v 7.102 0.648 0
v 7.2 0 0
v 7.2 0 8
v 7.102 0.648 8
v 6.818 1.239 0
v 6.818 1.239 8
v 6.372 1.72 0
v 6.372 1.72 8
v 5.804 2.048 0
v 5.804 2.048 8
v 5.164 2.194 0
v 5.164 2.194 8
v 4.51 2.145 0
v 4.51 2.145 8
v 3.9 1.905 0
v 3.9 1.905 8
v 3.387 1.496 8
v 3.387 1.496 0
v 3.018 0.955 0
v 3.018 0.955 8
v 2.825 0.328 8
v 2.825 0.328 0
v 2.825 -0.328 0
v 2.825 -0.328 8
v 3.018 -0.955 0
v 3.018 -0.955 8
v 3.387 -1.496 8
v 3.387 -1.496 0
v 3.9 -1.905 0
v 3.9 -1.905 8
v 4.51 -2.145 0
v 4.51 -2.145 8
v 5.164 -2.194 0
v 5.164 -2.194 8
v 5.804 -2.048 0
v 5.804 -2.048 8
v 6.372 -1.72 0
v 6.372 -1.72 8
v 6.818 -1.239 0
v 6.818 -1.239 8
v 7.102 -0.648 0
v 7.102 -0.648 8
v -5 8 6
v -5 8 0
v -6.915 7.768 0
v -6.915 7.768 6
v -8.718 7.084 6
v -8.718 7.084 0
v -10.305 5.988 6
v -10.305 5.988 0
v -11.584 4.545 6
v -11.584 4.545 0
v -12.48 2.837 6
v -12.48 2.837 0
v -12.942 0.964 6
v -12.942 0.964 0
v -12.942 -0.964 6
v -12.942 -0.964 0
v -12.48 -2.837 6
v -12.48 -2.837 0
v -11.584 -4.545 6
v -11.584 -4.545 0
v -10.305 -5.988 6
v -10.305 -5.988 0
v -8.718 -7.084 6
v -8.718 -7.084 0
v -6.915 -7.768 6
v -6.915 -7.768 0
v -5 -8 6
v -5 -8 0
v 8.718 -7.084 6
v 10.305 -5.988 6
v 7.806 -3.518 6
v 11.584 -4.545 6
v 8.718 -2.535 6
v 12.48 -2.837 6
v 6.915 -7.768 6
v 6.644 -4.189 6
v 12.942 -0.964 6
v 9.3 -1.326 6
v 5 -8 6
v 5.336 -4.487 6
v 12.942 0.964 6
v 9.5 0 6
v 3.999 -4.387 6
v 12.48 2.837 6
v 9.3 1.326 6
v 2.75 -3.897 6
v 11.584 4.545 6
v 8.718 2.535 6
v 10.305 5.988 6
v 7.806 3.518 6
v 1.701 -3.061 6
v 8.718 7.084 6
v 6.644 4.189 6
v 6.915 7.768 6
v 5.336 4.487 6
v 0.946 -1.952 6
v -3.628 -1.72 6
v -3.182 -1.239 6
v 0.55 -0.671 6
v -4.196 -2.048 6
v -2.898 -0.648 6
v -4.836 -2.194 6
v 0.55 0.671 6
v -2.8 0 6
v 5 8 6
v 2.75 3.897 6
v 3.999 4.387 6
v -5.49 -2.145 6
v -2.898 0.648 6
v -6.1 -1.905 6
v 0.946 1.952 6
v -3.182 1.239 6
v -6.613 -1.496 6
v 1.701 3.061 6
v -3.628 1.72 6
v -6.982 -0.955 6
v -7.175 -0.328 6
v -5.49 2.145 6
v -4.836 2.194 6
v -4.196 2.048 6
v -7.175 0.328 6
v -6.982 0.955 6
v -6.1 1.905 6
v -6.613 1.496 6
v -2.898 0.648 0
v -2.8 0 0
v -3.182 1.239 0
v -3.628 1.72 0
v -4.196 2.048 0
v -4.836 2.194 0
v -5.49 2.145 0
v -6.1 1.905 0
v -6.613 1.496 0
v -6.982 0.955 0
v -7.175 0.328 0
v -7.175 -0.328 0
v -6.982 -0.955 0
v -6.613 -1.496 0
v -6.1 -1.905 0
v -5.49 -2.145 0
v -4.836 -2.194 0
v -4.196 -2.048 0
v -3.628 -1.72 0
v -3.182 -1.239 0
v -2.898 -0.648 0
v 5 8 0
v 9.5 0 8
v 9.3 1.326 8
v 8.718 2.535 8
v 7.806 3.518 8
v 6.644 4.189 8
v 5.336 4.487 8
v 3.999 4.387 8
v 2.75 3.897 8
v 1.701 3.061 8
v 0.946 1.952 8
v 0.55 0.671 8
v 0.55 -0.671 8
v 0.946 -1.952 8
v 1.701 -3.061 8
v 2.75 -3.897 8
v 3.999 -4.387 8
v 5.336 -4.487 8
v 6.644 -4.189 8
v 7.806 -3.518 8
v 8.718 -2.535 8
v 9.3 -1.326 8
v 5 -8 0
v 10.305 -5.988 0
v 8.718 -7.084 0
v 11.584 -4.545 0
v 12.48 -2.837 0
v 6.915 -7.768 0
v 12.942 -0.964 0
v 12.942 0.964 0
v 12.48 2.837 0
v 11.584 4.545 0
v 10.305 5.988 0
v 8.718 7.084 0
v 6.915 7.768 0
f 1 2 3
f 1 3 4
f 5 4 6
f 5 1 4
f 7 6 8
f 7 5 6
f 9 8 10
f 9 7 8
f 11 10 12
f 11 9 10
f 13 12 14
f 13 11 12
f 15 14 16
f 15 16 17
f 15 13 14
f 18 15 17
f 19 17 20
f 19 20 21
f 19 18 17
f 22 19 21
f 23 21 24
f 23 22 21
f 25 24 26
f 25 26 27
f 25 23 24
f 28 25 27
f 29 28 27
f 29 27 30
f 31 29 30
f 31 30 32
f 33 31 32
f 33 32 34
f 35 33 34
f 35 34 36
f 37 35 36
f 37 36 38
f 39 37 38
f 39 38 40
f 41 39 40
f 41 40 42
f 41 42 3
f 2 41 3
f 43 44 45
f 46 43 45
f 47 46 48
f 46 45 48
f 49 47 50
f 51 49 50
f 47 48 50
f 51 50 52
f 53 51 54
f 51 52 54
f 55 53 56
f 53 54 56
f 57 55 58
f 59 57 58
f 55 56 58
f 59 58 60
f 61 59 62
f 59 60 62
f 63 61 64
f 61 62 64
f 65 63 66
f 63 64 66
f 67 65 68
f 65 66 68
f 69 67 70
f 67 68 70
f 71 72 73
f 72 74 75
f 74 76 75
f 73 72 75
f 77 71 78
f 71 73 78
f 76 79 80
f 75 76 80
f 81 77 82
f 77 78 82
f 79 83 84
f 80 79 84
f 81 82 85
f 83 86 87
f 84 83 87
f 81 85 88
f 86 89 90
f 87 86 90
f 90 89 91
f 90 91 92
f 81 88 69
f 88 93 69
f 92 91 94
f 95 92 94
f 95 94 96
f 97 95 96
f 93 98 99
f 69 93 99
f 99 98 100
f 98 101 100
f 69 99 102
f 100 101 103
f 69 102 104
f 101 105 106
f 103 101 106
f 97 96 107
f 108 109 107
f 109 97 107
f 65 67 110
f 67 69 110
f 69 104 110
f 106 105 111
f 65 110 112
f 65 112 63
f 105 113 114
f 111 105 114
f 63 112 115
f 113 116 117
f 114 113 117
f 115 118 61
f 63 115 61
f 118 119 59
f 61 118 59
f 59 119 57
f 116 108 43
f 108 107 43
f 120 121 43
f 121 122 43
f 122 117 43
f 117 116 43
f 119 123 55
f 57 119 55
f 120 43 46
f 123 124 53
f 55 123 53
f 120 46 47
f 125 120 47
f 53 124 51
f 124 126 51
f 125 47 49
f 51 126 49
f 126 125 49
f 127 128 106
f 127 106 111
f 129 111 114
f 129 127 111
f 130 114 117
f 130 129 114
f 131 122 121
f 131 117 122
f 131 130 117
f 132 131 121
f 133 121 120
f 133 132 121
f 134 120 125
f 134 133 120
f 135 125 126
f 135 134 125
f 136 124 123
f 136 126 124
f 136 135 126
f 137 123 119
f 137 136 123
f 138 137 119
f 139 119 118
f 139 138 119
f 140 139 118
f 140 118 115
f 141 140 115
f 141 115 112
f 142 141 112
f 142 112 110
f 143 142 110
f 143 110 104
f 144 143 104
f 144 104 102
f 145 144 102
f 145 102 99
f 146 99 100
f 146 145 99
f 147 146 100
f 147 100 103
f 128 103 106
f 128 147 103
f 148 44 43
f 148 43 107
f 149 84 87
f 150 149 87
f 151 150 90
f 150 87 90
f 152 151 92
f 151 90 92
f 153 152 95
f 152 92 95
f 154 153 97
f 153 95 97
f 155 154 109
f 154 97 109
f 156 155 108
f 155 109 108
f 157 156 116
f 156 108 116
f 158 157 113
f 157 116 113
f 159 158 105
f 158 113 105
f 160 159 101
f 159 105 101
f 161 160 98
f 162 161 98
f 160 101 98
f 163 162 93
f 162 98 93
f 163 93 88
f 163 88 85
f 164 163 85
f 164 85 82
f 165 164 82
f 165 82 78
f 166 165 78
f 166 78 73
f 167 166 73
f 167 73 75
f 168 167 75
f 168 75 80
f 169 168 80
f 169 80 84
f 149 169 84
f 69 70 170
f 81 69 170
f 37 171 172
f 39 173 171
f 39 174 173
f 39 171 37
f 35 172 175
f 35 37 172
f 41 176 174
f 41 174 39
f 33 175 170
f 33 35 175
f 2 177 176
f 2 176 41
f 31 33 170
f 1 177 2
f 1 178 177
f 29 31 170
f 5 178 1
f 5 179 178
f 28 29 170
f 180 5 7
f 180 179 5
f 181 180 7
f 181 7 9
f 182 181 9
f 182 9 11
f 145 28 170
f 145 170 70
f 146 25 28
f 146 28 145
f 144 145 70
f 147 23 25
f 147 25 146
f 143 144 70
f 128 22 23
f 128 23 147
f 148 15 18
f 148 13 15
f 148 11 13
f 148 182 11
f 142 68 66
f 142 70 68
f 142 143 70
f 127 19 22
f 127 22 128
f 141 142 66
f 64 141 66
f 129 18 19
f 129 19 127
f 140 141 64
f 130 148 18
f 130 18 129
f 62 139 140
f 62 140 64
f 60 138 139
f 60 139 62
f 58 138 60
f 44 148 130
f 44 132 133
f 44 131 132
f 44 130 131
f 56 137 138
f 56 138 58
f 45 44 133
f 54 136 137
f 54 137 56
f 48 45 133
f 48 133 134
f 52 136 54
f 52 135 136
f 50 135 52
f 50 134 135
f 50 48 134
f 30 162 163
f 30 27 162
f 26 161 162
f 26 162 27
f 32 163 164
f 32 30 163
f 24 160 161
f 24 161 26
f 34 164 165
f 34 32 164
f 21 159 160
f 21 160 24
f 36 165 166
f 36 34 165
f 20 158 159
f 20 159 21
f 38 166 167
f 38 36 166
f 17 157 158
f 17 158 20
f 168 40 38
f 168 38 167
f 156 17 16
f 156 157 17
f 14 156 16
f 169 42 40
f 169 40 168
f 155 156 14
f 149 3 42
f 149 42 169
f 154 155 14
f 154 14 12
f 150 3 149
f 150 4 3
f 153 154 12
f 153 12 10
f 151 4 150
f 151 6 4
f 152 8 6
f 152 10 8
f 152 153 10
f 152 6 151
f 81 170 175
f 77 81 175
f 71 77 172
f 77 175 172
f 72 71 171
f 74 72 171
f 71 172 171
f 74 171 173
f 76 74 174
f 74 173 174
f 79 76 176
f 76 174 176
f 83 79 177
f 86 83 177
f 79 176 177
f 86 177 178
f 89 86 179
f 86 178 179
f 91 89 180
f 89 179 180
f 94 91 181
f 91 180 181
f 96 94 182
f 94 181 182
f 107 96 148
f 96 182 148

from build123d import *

# Parameters (mm, degrees)
CYLINDER011_R     = 2.2
CYLINDER011_DEPTH = 10
CYLINDER012_R     = 2.2
CYLINDER012_DEPTH = 10
PAD015_DEPTH      = 6
CYLINDER013_R     = 4.5
CYLINDER013_DEPTH = 8


with BuildPart() as inserter_hole:
    # Cylinder011 → Cylinder011 (new body)
    with BuildSketch(Plane(origin=(5, 0, -2), x_dir=(1, 0, 0), z_dir=(0, 0, 1))):
        Circle(CYLINDER011_R)
    extrude(amount=CYLINDER011_DEPTH)


with BuildPart() as double_hole_fusion:
    # Cylinder012 → Cylinder012 (new body)
    with BuildSketch(Plane(origin=(-5, 0, -2), x_dir=(1, 0, 0), z_dir=(0, 0, 1))):
        Circle(CYLINDER012_R)
    extrude(amount=CYLINDER012_DEPTH)

    # Fusion010: union inserter hole
    add(inserter_hole.part)


with BuildPart() as body016:
    # Sketch016 → Pad015 (new body)
    with BuildSketch(Plane.XY):
        with BuildLine():
            Line((-5, 8), (5, 8))
            ThreePointArc((5, -8), (13, 0), (5, 8))
            Line((-5, -8), (5, -8))
            ThreePointArc((-5, 8), (-13, 0), (-5, -8))
        make_face()
    extrude(amount=PAD015_DEPTH)


with BuildPart() as simple_idle_linkage_cut:
    # Cylinder013 → Cylinder013 (new body)
    with BuildSketch(Plane(origin=(5, 0, 0), x_dir=(1, 0, 0), z_dir=(0, 0, 1))):
        Circle(CYLINDER013_R)
    extrude(amount=CYLINDER013_DEPTH)

    # Fusion011: union Body016
    add(body016.part)

    # Cut004: cut double hole fusion
    add(double_hole_fusion.part, mode=Mode.SUBTRACT)


solid = simple_idle_linkage_cut.part
